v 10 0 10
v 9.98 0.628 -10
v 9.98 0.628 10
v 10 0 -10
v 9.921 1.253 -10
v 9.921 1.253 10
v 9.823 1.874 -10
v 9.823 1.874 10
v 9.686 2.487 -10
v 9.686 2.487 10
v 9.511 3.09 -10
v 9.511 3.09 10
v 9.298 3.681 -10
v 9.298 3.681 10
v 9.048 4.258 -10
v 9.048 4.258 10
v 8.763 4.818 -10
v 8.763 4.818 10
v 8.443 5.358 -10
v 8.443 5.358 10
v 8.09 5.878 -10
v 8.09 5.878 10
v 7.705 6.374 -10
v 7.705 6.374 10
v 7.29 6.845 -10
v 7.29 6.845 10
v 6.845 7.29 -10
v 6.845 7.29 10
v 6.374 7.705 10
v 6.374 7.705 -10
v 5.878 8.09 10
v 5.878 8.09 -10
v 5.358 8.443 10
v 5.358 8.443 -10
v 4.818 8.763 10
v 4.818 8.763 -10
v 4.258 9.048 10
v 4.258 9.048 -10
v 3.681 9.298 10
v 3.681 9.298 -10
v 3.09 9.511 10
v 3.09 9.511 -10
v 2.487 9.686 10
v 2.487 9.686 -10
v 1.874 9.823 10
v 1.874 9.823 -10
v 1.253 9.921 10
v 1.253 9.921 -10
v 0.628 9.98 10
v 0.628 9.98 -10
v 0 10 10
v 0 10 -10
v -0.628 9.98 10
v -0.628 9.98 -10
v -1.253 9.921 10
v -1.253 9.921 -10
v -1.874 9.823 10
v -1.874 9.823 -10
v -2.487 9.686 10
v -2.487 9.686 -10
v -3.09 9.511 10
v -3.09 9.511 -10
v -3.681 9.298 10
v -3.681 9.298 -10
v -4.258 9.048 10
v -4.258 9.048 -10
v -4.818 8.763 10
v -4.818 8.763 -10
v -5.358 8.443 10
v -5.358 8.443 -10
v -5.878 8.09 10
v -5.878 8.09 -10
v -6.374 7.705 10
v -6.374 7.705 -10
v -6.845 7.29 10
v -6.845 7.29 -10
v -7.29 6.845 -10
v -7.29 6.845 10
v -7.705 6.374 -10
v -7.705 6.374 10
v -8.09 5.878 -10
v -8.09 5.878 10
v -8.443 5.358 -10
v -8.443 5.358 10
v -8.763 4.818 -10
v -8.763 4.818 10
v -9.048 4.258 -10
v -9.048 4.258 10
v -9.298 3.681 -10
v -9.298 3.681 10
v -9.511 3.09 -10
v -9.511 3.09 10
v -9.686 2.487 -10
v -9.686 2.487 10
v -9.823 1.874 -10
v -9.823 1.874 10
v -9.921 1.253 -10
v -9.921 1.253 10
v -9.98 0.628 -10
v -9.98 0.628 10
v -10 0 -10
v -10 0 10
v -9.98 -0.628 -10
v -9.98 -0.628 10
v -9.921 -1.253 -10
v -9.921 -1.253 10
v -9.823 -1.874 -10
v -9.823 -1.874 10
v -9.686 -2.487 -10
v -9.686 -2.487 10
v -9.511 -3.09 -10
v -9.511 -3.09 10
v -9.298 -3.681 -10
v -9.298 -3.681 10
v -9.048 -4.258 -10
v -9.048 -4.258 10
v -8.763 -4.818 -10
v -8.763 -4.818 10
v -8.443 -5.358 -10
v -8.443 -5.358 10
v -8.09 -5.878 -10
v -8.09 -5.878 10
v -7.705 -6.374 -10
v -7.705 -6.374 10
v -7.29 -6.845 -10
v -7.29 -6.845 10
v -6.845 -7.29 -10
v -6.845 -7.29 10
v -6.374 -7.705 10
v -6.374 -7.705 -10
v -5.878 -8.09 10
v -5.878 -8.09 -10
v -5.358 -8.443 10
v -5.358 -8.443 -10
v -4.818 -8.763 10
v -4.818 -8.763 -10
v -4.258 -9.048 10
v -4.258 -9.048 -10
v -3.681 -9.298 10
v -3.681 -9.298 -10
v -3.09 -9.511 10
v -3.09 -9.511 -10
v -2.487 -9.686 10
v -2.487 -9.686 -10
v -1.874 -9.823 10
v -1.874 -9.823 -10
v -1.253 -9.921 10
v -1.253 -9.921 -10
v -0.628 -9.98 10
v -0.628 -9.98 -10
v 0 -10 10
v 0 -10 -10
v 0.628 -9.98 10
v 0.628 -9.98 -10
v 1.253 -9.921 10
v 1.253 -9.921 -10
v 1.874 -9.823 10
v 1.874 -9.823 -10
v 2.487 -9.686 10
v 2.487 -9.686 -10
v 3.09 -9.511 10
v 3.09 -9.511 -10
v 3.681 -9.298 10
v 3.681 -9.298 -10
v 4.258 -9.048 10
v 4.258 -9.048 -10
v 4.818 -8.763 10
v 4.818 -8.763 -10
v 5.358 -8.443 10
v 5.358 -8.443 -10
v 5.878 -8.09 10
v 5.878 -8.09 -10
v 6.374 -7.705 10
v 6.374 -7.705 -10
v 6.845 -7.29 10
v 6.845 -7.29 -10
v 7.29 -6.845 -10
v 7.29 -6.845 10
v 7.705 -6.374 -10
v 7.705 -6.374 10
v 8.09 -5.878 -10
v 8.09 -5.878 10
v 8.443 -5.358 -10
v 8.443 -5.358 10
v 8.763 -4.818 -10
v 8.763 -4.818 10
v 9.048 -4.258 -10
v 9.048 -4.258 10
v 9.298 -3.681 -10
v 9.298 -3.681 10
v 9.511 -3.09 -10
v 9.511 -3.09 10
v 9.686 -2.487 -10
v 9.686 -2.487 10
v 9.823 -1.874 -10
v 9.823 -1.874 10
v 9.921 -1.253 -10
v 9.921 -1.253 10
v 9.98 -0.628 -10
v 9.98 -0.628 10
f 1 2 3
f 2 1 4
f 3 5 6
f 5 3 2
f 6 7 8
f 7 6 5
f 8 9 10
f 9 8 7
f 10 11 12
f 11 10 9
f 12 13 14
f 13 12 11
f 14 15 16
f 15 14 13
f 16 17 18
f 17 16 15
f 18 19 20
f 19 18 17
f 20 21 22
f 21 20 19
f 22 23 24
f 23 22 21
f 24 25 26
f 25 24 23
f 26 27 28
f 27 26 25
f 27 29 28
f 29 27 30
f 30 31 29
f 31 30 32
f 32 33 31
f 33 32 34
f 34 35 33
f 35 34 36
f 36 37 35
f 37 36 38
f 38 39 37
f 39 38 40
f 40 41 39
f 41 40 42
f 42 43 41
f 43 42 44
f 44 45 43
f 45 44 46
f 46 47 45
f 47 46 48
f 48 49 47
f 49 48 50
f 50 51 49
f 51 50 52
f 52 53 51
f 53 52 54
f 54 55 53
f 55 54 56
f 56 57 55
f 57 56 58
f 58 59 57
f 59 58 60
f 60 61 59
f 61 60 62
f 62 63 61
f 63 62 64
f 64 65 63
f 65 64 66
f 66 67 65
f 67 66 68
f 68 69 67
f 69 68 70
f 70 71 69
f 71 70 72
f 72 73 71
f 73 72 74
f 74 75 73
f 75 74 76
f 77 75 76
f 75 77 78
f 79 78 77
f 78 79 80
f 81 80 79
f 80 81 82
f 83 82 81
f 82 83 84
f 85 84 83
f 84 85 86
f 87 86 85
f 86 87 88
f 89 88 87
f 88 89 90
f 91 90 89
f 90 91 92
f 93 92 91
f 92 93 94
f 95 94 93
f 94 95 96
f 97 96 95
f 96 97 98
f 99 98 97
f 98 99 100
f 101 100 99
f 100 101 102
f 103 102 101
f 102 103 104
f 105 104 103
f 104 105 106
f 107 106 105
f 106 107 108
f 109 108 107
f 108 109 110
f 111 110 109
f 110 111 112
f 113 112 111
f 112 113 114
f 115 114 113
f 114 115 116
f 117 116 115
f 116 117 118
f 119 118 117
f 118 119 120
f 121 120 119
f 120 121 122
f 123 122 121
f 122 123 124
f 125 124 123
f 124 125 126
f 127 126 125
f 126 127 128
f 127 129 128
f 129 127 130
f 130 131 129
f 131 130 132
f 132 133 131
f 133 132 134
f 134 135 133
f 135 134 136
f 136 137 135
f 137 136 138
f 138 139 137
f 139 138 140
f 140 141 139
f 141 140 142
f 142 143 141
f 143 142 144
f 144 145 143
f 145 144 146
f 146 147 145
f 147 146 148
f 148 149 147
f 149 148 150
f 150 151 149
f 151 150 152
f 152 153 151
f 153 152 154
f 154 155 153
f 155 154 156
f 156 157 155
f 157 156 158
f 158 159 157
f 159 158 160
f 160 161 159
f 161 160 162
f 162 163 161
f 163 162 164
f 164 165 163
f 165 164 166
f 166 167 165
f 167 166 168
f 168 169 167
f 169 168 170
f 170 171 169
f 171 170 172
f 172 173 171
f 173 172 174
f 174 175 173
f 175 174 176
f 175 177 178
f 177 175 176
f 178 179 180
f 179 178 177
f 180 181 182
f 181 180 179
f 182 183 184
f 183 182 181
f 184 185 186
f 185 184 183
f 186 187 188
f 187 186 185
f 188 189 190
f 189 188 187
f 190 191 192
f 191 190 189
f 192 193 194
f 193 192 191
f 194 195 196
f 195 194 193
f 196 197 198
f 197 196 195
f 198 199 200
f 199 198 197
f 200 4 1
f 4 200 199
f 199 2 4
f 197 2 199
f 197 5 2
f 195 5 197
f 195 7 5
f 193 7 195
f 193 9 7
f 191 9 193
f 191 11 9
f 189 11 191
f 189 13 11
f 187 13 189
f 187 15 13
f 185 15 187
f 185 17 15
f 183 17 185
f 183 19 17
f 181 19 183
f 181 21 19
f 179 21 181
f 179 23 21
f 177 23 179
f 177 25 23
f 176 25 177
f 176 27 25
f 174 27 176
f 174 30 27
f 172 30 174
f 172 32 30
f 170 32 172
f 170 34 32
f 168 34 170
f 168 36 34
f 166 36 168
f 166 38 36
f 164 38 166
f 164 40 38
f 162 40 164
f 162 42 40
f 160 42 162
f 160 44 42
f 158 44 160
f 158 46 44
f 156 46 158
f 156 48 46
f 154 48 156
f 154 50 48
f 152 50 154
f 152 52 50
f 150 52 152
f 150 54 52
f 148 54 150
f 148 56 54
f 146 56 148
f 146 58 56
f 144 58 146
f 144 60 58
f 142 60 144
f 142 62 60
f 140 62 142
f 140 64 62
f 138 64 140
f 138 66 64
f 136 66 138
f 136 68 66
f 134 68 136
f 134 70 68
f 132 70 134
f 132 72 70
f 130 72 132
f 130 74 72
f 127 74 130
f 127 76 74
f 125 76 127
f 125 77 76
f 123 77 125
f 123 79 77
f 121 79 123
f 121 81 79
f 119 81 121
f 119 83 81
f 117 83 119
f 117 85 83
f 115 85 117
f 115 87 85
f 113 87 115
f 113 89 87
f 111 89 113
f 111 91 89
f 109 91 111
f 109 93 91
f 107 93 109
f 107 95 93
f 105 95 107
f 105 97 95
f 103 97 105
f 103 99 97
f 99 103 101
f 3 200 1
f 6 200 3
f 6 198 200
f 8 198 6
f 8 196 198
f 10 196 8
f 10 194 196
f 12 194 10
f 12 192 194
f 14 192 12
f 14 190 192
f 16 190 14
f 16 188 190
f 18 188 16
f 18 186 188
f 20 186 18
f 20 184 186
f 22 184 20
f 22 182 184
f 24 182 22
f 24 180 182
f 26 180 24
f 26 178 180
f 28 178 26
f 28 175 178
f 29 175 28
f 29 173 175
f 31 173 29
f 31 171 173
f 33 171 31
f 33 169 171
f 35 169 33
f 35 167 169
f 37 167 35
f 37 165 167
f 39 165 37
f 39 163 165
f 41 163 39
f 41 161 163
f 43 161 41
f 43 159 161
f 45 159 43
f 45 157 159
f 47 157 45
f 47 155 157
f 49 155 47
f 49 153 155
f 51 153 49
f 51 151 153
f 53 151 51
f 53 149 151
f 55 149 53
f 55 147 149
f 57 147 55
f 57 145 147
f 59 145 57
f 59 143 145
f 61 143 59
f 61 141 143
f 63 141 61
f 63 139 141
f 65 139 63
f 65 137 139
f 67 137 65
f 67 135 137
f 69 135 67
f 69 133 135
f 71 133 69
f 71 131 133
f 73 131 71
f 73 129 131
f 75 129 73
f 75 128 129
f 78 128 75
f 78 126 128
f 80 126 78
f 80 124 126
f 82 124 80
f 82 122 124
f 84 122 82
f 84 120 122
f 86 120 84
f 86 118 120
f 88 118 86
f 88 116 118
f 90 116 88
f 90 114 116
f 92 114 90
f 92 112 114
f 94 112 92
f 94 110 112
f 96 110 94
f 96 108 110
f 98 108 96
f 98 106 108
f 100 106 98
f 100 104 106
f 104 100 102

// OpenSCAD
// Simple Cylinder
// Customizable parametric design

// Parameters
height = 20;  // mm
radius = 10;  // mm
$fn = 100;    // Smoothness

// Model
cylinder(h=height, r=radius, center=true);
